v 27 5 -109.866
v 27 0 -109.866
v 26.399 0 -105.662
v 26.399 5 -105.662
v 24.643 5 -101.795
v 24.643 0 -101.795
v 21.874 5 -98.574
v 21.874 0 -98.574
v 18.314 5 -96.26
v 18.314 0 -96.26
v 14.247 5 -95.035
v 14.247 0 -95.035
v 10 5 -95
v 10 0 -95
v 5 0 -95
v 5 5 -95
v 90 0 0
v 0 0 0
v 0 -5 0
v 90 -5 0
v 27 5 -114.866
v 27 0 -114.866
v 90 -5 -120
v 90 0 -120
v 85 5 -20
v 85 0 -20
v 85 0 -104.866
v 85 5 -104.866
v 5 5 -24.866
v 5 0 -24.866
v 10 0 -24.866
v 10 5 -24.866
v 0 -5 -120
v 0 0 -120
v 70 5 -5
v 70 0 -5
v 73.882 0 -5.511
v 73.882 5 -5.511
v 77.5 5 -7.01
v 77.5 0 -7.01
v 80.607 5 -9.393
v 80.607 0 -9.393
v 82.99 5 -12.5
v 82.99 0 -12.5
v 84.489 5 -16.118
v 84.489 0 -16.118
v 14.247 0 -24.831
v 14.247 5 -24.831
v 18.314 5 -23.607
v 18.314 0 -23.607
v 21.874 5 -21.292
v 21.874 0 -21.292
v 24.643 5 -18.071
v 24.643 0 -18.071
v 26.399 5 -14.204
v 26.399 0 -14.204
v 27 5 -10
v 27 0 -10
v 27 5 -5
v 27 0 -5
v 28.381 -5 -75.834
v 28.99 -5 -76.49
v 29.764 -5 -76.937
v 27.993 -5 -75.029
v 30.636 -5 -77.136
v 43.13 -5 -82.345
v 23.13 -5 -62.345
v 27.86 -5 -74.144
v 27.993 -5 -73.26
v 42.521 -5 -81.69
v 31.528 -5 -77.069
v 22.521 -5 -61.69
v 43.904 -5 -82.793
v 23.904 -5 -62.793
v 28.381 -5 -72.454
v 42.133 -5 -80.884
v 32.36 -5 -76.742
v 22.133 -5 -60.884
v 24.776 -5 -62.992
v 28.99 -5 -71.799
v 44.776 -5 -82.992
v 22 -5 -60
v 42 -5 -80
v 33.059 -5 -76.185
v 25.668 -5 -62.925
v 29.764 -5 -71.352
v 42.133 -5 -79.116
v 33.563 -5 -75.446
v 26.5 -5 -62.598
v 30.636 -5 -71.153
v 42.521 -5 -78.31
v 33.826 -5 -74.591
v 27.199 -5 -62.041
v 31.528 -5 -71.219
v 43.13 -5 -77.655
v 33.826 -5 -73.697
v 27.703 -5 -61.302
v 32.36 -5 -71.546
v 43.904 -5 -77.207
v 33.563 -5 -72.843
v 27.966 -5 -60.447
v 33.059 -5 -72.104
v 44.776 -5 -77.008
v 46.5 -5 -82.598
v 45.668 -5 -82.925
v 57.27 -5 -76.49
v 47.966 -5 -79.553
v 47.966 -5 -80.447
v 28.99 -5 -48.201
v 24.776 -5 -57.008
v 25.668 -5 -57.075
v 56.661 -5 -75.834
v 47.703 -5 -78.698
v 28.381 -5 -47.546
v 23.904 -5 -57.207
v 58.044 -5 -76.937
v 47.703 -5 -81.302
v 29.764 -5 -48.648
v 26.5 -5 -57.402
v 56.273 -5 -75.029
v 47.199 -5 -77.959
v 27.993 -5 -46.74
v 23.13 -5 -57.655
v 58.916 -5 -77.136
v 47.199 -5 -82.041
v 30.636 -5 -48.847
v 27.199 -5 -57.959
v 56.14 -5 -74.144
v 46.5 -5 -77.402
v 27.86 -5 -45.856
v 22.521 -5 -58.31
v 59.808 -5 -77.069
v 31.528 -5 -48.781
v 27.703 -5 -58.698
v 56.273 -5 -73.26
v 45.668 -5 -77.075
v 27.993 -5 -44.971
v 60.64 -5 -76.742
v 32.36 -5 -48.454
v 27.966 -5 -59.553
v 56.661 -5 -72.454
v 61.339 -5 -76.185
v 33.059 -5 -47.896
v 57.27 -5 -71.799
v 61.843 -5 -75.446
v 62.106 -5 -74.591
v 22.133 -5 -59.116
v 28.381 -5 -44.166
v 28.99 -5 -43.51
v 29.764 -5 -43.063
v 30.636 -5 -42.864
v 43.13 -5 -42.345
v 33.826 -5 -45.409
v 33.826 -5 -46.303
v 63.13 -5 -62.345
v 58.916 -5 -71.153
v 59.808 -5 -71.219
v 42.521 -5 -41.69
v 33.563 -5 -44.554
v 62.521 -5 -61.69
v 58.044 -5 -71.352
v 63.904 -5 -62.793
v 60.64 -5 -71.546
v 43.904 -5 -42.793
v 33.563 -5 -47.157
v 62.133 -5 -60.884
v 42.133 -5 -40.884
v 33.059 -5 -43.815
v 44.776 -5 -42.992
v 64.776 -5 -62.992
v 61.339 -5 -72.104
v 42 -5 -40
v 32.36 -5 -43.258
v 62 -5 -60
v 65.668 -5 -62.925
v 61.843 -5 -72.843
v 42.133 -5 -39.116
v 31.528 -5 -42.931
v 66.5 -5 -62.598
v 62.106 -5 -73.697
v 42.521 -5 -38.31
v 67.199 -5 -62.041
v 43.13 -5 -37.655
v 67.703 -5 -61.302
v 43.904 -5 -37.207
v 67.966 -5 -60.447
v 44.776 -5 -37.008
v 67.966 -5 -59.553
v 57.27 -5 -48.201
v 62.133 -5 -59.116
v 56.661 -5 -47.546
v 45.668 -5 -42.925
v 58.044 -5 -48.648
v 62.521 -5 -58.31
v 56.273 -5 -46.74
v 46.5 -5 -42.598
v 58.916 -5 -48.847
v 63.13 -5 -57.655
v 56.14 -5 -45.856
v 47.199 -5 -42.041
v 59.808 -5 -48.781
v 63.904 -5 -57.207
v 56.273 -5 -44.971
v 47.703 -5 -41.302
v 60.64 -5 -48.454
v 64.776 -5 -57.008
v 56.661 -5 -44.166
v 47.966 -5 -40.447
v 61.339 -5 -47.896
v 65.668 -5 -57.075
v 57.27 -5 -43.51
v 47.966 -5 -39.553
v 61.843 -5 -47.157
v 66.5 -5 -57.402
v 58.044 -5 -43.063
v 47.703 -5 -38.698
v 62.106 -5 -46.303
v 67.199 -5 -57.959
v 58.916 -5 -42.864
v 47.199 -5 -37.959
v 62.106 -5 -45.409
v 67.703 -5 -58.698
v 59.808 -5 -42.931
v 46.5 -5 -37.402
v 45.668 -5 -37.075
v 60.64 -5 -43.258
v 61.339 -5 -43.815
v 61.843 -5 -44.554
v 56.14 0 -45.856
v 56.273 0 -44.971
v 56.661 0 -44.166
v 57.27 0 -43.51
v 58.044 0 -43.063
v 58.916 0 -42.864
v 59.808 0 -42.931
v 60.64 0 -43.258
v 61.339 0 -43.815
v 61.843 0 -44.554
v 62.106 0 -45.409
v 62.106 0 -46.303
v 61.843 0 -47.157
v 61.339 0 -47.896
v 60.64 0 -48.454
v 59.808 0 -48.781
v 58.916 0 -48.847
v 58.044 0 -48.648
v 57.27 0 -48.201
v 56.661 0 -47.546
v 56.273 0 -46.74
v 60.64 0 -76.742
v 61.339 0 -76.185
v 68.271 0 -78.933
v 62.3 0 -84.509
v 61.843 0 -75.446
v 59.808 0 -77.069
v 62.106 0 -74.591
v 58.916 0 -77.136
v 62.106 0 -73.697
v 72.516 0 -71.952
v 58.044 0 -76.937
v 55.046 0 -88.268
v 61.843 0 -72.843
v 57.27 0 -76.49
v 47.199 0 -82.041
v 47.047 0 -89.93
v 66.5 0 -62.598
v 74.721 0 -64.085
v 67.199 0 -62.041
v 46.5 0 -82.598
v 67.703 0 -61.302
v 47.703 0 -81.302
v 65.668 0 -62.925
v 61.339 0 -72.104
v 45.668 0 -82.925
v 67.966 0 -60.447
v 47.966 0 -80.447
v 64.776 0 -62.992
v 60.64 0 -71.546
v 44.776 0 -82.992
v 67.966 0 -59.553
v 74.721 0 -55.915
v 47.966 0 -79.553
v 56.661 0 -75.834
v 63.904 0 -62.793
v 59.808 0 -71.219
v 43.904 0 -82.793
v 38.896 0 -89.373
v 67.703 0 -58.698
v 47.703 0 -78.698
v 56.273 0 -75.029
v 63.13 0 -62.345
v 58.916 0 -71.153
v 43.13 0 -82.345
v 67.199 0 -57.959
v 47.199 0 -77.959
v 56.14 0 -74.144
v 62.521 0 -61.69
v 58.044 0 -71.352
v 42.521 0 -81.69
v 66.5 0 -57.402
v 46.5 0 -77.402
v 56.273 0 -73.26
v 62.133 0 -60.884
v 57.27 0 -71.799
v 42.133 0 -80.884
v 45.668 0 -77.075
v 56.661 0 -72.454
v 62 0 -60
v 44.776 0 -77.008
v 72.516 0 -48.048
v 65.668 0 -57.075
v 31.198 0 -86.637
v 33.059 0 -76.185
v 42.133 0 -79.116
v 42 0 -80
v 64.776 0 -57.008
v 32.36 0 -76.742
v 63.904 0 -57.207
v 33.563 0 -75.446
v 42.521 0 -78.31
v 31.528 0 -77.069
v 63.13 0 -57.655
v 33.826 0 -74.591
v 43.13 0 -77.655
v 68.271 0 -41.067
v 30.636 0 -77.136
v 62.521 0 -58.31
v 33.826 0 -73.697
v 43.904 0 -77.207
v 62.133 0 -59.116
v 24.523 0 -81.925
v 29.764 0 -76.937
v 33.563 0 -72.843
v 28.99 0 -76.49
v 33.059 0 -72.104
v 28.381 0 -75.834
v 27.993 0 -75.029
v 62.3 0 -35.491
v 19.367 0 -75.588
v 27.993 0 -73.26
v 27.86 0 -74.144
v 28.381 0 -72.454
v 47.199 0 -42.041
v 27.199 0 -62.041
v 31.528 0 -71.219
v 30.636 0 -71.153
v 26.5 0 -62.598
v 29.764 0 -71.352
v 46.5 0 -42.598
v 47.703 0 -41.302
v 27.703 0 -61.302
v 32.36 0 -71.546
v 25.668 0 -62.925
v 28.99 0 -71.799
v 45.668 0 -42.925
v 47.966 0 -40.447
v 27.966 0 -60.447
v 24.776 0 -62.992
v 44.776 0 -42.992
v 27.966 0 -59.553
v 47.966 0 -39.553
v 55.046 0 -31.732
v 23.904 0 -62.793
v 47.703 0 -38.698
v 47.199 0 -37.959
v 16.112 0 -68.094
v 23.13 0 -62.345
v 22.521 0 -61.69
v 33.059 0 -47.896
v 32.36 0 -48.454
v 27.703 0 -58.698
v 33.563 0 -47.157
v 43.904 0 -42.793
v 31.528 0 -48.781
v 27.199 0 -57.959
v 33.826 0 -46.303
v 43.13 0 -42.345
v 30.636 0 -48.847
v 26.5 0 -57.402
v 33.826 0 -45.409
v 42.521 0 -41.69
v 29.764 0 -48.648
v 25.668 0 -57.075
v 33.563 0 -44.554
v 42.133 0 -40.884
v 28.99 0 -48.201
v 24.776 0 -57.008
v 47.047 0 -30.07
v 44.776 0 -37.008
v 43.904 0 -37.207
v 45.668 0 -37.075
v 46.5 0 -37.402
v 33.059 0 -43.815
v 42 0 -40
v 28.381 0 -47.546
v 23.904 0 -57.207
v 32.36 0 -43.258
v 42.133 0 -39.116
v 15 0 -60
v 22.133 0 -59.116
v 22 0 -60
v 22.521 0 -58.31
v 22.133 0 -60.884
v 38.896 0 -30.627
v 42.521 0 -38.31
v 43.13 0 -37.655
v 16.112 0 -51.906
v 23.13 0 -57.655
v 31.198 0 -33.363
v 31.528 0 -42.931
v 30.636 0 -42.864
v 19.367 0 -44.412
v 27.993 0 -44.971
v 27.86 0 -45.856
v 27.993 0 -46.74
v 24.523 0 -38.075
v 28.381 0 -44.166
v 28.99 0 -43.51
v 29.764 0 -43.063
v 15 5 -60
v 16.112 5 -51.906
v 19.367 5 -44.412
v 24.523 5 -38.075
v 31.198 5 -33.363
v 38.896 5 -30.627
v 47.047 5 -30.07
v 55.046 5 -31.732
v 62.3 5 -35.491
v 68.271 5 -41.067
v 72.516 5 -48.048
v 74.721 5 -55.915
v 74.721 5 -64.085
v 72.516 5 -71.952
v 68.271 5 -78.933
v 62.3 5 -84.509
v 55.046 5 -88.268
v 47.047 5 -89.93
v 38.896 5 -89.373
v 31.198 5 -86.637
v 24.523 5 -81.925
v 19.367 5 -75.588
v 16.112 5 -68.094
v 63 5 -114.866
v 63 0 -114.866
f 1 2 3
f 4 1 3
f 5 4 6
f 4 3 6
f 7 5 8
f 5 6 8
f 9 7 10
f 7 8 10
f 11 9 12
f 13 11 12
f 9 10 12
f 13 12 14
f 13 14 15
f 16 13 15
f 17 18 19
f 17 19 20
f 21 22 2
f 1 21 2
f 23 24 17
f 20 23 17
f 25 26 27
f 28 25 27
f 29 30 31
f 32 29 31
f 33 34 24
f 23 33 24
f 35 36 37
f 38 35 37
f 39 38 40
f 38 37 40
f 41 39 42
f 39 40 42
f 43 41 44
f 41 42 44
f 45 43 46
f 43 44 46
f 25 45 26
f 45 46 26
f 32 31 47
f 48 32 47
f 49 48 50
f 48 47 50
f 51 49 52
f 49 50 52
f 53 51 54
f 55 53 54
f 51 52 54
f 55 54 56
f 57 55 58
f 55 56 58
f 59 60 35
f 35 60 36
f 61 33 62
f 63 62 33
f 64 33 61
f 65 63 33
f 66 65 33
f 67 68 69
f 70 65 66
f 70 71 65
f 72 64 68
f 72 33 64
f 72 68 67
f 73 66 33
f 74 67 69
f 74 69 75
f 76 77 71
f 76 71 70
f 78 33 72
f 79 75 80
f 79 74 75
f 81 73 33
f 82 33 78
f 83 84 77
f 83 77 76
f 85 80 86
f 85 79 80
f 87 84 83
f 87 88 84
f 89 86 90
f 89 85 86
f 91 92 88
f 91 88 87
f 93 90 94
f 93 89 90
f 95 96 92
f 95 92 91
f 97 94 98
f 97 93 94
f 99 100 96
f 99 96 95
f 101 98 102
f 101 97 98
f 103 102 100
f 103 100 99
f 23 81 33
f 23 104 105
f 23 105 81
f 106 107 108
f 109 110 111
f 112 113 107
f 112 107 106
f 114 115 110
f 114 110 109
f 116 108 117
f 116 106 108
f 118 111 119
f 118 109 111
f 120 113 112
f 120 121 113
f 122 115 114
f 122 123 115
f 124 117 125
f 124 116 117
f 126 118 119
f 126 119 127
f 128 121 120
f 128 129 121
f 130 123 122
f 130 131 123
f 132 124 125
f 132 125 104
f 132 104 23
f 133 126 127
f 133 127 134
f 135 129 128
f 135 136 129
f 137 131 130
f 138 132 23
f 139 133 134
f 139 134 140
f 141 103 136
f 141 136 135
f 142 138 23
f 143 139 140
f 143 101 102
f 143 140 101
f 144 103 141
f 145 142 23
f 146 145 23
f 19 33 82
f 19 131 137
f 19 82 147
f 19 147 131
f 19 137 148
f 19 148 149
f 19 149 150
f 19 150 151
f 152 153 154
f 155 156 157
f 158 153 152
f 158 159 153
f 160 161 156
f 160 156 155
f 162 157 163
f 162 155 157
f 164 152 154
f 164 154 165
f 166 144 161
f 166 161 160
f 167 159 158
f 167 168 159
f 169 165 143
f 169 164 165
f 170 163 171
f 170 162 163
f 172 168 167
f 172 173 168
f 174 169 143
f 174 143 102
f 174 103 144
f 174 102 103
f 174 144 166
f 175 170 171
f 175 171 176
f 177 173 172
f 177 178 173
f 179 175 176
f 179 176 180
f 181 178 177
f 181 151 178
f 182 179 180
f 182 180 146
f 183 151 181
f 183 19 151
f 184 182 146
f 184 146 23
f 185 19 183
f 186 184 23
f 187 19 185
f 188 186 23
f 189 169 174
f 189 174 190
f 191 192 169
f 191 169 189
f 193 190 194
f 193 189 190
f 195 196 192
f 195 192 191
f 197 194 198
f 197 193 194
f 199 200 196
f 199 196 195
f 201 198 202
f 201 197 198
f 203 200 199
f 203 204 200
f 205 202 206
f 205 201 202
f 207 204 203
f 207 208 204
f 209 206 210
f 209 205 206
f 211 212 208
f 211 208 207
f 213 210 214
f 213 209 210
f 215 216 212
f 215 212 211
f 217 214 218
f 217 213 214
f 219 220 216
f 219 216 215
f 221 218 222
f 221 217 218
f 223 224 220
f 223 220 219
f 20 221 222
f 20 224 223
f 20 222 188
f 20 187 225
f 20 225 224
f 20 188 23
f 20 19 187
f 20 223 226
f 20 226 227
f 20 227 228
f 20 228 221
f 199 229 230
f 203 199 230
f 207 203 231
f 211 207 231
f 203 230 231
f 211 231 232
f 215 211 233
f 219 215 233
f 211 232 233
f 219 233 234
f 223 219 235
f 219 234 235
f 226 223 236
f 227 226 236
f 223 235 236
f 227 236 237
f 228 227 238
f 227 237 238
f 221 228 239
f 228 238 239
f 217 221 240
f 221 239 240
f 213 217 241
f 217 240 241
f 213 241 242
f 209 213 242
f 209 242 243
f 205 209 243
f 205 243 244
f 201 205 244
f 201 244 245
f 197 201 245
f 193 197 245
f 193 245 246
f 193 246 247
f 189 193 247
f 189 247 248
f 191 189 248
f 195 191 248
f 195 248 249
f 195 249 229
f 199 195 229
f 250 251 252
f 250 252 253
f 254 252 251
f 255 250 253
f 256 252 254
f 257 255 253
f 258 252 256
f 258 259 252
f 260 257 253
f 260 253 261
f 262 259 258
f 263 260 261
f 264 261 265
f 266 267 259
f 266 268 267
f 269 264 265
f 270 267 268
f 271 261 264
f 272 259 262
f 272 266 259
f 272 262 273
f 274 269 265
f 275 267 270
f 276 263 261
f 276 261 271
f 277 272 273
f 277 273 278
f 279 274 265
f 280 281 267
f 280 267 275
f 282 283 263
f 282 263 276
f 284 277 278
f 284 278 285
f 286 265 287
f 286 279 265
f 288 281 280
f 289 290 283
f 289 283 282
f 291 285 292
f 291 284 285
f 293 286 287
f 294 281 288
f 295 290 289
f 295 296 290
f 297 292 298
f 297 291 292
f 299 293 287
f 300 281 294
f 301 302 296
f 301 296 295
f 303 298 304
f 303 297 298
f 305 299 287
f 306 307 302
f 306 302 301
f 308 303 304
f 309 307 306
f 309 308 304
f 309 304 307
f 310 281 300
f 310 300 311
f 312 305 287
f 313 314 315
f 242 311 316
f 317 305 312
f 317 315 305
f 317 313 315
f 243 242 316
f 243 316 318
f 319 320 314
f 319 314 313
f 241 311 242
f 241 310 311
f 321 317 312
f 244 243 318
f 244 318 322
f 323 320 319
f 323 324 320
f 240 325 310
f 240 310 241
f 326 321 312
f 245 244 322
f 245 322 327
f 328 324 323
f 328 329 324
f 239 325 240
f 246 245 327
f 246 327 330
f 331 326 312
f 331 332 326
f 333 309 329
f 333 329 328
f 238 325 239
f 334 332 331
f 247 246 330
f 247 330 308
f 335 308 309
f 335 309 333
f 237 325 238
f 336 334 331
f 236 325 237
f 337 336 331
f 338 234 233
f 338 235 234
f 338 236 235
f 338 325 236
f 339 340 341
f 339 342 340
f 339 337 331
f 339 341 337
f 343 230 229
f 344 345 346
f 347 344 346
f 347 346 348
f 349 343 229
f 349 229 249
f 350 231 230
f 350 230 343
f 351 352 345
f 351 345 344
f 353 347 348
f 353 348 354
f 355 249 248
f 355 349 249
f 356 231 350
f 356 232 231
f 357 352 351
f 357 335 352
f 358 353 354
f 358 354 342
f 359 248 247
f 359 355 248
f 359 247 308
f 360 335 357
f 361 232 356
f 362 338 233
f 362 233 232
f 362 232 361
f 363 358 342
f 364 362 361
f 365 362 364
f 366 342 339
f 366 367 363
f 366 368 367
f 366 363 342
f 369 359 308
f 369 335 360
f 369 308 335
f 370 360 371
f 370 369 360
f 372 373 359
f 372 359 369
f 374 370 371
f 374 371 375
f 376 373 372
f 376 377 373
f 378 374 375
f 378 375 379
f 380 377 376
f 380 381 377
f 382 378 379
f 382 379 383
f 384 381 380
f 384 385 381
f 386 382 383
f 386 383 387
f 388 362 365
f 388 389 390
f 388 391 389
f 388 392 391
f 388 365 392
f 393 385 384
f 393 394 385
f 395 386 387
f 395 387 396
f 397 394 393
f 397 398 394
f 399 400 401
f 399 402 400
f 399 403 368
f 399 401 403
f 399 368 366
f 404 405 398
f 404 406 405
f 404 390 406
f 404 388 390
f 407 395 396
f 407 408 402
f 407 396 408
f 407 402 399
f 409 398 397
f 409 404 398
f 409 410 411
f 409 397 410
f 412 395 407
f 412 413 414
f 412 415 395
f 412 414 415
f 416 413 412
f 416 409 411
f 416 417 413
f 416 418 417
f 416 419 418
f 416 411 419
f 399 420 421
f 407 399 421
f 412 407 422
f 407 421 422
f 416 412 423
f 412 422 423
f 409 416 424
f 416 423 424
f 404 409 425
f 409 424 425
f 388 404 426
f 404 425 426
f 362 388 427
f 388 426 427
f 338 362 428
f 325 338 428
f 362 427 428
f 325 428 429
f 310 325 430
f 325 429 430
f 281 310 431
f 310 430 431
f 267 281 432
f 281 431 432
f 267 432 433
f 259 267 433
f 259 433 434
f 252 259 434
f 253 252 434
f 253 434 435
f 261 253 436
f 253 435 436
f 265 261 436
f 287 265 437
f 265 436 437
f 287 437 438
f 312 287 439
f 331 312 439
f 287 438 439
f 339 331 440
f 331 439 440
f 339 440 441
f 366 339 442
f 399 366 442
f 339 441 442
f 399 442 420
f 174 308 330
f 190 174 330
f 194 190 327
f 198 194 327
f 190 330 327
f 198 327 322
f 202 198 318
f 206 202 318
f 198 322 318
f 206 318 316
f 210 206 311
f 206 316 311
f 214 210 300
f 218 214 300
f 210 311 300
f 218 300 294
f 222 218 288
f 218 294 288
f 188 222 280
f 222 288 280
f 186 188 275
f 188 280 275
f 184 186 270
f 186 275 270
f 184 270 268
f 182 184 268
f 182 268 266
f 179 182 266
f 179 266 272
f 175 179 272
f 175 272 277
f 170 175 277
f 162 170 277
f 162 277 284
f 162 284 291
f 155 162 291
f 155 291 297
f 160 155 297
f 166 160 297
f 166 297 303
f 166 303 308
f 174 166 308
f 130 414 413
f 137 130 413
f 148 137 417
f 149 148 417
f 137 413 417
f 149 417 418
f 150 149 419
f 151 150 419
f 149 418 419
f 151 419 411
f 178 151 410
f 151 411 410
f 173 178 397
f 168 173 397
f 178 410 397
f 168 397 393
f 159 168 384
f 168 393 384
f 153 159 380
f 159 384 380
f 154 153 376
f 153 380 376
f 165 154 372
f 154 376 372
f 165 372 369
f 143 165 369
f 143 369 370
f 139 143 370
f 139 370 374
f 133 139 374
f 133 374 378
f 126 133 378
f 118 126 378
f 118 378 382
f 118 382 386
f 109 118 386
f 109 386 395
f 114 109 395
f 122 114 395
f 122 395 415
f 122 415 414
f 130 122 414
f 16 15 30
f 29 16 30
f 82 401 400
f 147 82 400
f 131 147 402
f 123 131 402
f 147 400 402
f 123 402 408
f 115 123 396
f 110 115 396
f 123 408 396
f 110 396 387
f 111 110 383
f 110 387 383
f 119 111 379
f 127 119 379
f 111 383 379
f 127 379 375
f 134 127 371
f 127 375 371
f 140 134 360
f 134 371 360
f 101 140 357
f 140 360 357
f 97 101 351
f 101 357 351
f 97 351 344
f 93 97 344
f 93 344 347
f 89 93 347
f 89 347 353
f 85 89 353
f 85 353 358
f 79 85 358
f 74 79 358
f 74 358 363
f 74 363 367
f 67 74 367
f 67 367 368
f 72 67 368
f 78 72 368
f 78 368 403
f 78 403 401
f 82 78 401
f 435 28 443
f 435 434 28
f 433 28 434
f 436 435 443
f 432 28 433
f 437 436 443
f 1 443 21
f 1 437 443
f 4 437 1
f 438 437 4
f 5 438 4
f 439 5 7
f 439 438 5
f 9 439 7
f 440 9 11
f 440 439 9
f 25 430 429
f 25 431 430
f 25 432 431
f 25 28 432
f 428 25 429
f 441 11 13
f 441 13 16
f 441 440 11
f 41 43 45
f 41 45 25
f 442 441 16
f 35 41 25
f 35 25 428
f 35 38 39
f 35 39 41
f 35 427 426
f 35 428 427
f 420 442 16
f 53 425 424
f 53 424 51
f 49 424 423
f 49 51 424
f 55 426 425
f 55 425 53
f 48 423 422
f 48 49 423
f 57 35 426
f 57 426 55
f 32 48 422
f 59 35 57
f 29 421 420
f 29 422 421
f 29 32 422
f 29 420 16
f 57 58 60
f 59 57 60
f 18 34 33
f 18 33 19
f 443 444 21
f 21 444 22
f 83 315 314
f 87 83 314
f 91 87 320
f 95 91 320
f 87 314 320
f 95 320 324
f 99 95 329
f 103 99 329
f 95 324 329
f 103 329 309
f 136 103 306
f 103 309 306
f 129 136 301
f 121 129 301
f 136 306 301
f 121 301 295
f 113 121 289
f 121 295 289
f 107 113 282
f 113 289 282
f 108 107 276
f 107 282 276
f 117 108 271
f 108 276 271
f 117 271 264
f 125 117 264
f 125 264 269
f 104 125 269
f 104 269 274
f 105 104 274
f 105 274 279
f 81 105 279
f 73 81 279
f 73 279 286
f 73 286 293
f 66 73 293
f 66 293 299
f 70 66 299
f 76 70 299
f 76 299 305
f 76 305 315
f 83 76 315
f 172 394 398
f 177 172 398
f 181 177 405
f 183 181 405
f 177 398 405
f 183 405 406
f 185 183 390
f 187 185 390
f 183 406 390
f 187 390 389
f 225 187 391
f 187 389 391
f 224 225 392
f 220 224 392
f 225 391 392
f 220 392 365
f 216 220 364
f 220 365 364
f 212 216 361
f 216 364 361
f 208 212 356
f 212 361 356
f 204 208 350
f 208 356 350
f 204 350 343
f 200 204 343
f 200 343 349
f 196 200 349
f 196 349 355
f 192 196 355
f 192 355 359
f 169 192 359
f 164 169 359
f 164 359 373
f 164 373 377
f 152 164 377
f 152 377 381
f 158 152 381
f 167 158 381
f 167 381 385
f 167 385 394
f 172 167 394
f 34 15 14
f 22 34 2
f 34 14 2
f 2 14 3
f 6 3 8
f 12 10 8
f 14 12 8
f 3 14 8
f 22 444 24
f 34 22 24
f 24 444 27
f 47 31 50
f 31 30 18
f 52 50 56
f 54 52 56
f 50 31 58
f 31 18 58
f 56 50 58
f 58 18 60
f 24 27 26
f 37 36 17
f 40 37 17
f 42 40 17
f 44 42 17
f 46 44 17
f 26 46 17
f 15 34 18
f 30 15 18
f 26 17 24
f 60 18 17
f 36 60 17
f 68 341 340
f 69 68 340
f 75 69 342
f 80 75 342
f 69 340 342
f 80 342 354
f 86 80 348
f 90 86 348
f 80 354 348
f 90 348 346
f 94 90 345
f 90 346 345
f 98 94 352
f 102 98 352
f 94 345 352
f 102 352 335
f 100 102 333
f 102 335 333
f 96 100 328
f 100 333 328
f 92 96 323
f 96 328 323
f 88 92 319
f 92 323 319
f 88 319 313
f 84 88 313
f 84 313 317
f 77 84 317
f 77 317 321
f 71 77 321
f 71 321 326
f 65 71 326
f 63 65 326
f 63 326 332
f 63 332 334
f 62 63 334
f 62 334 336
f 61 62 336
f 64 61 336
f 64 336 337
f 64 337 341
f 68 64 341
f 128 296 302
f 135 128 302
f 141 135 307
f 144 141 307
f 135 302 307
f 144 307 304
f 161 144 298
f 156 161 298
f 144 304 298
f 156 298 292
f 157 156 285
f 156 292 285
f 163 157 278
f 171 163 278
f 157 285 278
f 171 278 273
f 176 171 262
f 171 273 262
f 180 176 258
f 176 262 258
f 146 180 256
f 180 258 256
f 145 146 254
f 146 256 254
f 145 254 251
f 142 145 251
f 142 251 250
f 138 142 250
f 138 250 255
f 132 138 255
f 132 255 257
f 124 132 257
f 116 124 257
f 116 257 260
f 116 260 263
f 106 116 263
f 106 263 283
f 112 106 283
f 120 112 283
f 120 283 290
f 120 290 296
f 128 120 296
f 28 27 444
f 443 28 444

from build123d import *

# Parameters (mm, degrees)
F0_W     = 90
F0_H     = 120
F1_DEPTH = 5
F3_DEPTH = 5
F4_R     = 30
F4_R_2   = 3
F5_DEPTH = 5
F6_DEPTH = 5
F7_DEPTH = 10


with BuildPart() as f1:
    # F0 (on Front) → F1 (new body)
    with BuildSketch(Plane.XZ):
        with Locations((45, -60)):
            Rectangle(F0_W, F0_H)
    extrude(amount=F1_DEPTH)

    # F2 (on face) → F3 (join)
    with BuildSketch(Plane(origin=(0, 0, 0), x_dir=(-1, 0, 0), z_dir=(0, 1, 0))):
        with BuildLine():
            Line((-85, -104.8660687473), (-63, -114.8660687473))
            Line((-63, -114.8660687473), (-27, -114.8660687473))
            Line((-27, -114.8660687473), (-27, -109.8660687473))
            ThreePointArc((-27, -109.8660687473), (-21.8742088291, -98.5744789567), (-10, -95))
            Line((-10, -95), (-5, -95))
            Line((-5, -95), (-5, -24.8660687473))
            Line((-5, -24.8660687473), (-10, -24.8660687473))
            ThreePointArc((-10, -24.8660687473), (-21.8742088291, -21.2915897906), (-27, -10))
            Line((-27, -10), (-27, -5))
            Line((-27, -5), (-70, -5))
            ThreePointArc((-70, -5), (-80.6066017178, -9.3933982822), (-85, -20))
            Line((-85, -20), (-85, -104.8660687473))
        make_face()
    extrude(amount=F3_DEPTH)

    # F4 (on face) → F5 (cut)
    with BuildSketch(Plane(origin=(0, 5, 0), x_dir=(-1, 0, 0), z_dir=(0, 1, 0))):
        with Locations((-45, -60)):
            Circle(F4_R)
        with Locations((-59.14, -74.144270925)):
            Circle(F4_R_2, mode=Mode.SUBTRACT)
        with Locations((-65, -60)):
            Circle(F4_R_2, mode=Mode.SUBTRACT)
        with Locations((-45, -80)):
            Circle(F4_R_2, mode=Mode.SUBTRACT)
        with Locations((-30.86, -74.144270925)):
            Circle(F4_R_2, mode=Mode.SUBTRACT)
        with Locations((-25, -60)):
            Circle(F4_R_2, mode=Mode.SUBTRACT)
        with Locations((-59.14, -45.855729075)):
            Circle(F4_R_2, mode=Mode.SUBTRACT)
        with Locations((-45, -40)):
            Circle(F4_R_2, mode=Mode.SUBTRACT)
        with Locations((-30.86, -45.855729075)):
            Circle(F4_R_2, mode=Mode.SUBTRACT)
    extrude(amount=-F5_DEPTH, mode=Mode.SUBTRACT)

    # F6 (cut): a face of the model
    f6_faces = [f1.faces().sort_by_distance(p)[0] for p in [
        (25, 5, -60),
    ]]
    extrude(f6_faces, amount=-F6_DEPTH, mode=Mode.SUBTRACT)

    # F4 (on face) → F7 (cut)
    with BuildSketch(Plane(origin=(0, 5, 0), x_dir=(-1, 0, 0), z_dir=(0, 1, 0))):
        with Locations((-45, -80)):
            Circle(F4_R_2)
        with Locations((-30.86, -74.144270925)):
            Circle(F4_R_2)
        with Locations((-59.14, -45.855729075)):
            Circle(F4_R_2)
        with Locations((-65, -60)):
            Circle(F4_R_2)
        with Locations((-59.14, -74.144270925)):
            Circle(F4_R_2)
        with Locations((-30.86, -45.855729075)):
            Circle(F4_R_2)
        with Locations((-45, -40)):
            Circle(F4_R_2)
        with Locations((-25, -60)):
            Circle(F4_R_2)
    extrude(amount=-F7_DEPTH, mode=Mode.SUBTRACT)


solid = f1.part
